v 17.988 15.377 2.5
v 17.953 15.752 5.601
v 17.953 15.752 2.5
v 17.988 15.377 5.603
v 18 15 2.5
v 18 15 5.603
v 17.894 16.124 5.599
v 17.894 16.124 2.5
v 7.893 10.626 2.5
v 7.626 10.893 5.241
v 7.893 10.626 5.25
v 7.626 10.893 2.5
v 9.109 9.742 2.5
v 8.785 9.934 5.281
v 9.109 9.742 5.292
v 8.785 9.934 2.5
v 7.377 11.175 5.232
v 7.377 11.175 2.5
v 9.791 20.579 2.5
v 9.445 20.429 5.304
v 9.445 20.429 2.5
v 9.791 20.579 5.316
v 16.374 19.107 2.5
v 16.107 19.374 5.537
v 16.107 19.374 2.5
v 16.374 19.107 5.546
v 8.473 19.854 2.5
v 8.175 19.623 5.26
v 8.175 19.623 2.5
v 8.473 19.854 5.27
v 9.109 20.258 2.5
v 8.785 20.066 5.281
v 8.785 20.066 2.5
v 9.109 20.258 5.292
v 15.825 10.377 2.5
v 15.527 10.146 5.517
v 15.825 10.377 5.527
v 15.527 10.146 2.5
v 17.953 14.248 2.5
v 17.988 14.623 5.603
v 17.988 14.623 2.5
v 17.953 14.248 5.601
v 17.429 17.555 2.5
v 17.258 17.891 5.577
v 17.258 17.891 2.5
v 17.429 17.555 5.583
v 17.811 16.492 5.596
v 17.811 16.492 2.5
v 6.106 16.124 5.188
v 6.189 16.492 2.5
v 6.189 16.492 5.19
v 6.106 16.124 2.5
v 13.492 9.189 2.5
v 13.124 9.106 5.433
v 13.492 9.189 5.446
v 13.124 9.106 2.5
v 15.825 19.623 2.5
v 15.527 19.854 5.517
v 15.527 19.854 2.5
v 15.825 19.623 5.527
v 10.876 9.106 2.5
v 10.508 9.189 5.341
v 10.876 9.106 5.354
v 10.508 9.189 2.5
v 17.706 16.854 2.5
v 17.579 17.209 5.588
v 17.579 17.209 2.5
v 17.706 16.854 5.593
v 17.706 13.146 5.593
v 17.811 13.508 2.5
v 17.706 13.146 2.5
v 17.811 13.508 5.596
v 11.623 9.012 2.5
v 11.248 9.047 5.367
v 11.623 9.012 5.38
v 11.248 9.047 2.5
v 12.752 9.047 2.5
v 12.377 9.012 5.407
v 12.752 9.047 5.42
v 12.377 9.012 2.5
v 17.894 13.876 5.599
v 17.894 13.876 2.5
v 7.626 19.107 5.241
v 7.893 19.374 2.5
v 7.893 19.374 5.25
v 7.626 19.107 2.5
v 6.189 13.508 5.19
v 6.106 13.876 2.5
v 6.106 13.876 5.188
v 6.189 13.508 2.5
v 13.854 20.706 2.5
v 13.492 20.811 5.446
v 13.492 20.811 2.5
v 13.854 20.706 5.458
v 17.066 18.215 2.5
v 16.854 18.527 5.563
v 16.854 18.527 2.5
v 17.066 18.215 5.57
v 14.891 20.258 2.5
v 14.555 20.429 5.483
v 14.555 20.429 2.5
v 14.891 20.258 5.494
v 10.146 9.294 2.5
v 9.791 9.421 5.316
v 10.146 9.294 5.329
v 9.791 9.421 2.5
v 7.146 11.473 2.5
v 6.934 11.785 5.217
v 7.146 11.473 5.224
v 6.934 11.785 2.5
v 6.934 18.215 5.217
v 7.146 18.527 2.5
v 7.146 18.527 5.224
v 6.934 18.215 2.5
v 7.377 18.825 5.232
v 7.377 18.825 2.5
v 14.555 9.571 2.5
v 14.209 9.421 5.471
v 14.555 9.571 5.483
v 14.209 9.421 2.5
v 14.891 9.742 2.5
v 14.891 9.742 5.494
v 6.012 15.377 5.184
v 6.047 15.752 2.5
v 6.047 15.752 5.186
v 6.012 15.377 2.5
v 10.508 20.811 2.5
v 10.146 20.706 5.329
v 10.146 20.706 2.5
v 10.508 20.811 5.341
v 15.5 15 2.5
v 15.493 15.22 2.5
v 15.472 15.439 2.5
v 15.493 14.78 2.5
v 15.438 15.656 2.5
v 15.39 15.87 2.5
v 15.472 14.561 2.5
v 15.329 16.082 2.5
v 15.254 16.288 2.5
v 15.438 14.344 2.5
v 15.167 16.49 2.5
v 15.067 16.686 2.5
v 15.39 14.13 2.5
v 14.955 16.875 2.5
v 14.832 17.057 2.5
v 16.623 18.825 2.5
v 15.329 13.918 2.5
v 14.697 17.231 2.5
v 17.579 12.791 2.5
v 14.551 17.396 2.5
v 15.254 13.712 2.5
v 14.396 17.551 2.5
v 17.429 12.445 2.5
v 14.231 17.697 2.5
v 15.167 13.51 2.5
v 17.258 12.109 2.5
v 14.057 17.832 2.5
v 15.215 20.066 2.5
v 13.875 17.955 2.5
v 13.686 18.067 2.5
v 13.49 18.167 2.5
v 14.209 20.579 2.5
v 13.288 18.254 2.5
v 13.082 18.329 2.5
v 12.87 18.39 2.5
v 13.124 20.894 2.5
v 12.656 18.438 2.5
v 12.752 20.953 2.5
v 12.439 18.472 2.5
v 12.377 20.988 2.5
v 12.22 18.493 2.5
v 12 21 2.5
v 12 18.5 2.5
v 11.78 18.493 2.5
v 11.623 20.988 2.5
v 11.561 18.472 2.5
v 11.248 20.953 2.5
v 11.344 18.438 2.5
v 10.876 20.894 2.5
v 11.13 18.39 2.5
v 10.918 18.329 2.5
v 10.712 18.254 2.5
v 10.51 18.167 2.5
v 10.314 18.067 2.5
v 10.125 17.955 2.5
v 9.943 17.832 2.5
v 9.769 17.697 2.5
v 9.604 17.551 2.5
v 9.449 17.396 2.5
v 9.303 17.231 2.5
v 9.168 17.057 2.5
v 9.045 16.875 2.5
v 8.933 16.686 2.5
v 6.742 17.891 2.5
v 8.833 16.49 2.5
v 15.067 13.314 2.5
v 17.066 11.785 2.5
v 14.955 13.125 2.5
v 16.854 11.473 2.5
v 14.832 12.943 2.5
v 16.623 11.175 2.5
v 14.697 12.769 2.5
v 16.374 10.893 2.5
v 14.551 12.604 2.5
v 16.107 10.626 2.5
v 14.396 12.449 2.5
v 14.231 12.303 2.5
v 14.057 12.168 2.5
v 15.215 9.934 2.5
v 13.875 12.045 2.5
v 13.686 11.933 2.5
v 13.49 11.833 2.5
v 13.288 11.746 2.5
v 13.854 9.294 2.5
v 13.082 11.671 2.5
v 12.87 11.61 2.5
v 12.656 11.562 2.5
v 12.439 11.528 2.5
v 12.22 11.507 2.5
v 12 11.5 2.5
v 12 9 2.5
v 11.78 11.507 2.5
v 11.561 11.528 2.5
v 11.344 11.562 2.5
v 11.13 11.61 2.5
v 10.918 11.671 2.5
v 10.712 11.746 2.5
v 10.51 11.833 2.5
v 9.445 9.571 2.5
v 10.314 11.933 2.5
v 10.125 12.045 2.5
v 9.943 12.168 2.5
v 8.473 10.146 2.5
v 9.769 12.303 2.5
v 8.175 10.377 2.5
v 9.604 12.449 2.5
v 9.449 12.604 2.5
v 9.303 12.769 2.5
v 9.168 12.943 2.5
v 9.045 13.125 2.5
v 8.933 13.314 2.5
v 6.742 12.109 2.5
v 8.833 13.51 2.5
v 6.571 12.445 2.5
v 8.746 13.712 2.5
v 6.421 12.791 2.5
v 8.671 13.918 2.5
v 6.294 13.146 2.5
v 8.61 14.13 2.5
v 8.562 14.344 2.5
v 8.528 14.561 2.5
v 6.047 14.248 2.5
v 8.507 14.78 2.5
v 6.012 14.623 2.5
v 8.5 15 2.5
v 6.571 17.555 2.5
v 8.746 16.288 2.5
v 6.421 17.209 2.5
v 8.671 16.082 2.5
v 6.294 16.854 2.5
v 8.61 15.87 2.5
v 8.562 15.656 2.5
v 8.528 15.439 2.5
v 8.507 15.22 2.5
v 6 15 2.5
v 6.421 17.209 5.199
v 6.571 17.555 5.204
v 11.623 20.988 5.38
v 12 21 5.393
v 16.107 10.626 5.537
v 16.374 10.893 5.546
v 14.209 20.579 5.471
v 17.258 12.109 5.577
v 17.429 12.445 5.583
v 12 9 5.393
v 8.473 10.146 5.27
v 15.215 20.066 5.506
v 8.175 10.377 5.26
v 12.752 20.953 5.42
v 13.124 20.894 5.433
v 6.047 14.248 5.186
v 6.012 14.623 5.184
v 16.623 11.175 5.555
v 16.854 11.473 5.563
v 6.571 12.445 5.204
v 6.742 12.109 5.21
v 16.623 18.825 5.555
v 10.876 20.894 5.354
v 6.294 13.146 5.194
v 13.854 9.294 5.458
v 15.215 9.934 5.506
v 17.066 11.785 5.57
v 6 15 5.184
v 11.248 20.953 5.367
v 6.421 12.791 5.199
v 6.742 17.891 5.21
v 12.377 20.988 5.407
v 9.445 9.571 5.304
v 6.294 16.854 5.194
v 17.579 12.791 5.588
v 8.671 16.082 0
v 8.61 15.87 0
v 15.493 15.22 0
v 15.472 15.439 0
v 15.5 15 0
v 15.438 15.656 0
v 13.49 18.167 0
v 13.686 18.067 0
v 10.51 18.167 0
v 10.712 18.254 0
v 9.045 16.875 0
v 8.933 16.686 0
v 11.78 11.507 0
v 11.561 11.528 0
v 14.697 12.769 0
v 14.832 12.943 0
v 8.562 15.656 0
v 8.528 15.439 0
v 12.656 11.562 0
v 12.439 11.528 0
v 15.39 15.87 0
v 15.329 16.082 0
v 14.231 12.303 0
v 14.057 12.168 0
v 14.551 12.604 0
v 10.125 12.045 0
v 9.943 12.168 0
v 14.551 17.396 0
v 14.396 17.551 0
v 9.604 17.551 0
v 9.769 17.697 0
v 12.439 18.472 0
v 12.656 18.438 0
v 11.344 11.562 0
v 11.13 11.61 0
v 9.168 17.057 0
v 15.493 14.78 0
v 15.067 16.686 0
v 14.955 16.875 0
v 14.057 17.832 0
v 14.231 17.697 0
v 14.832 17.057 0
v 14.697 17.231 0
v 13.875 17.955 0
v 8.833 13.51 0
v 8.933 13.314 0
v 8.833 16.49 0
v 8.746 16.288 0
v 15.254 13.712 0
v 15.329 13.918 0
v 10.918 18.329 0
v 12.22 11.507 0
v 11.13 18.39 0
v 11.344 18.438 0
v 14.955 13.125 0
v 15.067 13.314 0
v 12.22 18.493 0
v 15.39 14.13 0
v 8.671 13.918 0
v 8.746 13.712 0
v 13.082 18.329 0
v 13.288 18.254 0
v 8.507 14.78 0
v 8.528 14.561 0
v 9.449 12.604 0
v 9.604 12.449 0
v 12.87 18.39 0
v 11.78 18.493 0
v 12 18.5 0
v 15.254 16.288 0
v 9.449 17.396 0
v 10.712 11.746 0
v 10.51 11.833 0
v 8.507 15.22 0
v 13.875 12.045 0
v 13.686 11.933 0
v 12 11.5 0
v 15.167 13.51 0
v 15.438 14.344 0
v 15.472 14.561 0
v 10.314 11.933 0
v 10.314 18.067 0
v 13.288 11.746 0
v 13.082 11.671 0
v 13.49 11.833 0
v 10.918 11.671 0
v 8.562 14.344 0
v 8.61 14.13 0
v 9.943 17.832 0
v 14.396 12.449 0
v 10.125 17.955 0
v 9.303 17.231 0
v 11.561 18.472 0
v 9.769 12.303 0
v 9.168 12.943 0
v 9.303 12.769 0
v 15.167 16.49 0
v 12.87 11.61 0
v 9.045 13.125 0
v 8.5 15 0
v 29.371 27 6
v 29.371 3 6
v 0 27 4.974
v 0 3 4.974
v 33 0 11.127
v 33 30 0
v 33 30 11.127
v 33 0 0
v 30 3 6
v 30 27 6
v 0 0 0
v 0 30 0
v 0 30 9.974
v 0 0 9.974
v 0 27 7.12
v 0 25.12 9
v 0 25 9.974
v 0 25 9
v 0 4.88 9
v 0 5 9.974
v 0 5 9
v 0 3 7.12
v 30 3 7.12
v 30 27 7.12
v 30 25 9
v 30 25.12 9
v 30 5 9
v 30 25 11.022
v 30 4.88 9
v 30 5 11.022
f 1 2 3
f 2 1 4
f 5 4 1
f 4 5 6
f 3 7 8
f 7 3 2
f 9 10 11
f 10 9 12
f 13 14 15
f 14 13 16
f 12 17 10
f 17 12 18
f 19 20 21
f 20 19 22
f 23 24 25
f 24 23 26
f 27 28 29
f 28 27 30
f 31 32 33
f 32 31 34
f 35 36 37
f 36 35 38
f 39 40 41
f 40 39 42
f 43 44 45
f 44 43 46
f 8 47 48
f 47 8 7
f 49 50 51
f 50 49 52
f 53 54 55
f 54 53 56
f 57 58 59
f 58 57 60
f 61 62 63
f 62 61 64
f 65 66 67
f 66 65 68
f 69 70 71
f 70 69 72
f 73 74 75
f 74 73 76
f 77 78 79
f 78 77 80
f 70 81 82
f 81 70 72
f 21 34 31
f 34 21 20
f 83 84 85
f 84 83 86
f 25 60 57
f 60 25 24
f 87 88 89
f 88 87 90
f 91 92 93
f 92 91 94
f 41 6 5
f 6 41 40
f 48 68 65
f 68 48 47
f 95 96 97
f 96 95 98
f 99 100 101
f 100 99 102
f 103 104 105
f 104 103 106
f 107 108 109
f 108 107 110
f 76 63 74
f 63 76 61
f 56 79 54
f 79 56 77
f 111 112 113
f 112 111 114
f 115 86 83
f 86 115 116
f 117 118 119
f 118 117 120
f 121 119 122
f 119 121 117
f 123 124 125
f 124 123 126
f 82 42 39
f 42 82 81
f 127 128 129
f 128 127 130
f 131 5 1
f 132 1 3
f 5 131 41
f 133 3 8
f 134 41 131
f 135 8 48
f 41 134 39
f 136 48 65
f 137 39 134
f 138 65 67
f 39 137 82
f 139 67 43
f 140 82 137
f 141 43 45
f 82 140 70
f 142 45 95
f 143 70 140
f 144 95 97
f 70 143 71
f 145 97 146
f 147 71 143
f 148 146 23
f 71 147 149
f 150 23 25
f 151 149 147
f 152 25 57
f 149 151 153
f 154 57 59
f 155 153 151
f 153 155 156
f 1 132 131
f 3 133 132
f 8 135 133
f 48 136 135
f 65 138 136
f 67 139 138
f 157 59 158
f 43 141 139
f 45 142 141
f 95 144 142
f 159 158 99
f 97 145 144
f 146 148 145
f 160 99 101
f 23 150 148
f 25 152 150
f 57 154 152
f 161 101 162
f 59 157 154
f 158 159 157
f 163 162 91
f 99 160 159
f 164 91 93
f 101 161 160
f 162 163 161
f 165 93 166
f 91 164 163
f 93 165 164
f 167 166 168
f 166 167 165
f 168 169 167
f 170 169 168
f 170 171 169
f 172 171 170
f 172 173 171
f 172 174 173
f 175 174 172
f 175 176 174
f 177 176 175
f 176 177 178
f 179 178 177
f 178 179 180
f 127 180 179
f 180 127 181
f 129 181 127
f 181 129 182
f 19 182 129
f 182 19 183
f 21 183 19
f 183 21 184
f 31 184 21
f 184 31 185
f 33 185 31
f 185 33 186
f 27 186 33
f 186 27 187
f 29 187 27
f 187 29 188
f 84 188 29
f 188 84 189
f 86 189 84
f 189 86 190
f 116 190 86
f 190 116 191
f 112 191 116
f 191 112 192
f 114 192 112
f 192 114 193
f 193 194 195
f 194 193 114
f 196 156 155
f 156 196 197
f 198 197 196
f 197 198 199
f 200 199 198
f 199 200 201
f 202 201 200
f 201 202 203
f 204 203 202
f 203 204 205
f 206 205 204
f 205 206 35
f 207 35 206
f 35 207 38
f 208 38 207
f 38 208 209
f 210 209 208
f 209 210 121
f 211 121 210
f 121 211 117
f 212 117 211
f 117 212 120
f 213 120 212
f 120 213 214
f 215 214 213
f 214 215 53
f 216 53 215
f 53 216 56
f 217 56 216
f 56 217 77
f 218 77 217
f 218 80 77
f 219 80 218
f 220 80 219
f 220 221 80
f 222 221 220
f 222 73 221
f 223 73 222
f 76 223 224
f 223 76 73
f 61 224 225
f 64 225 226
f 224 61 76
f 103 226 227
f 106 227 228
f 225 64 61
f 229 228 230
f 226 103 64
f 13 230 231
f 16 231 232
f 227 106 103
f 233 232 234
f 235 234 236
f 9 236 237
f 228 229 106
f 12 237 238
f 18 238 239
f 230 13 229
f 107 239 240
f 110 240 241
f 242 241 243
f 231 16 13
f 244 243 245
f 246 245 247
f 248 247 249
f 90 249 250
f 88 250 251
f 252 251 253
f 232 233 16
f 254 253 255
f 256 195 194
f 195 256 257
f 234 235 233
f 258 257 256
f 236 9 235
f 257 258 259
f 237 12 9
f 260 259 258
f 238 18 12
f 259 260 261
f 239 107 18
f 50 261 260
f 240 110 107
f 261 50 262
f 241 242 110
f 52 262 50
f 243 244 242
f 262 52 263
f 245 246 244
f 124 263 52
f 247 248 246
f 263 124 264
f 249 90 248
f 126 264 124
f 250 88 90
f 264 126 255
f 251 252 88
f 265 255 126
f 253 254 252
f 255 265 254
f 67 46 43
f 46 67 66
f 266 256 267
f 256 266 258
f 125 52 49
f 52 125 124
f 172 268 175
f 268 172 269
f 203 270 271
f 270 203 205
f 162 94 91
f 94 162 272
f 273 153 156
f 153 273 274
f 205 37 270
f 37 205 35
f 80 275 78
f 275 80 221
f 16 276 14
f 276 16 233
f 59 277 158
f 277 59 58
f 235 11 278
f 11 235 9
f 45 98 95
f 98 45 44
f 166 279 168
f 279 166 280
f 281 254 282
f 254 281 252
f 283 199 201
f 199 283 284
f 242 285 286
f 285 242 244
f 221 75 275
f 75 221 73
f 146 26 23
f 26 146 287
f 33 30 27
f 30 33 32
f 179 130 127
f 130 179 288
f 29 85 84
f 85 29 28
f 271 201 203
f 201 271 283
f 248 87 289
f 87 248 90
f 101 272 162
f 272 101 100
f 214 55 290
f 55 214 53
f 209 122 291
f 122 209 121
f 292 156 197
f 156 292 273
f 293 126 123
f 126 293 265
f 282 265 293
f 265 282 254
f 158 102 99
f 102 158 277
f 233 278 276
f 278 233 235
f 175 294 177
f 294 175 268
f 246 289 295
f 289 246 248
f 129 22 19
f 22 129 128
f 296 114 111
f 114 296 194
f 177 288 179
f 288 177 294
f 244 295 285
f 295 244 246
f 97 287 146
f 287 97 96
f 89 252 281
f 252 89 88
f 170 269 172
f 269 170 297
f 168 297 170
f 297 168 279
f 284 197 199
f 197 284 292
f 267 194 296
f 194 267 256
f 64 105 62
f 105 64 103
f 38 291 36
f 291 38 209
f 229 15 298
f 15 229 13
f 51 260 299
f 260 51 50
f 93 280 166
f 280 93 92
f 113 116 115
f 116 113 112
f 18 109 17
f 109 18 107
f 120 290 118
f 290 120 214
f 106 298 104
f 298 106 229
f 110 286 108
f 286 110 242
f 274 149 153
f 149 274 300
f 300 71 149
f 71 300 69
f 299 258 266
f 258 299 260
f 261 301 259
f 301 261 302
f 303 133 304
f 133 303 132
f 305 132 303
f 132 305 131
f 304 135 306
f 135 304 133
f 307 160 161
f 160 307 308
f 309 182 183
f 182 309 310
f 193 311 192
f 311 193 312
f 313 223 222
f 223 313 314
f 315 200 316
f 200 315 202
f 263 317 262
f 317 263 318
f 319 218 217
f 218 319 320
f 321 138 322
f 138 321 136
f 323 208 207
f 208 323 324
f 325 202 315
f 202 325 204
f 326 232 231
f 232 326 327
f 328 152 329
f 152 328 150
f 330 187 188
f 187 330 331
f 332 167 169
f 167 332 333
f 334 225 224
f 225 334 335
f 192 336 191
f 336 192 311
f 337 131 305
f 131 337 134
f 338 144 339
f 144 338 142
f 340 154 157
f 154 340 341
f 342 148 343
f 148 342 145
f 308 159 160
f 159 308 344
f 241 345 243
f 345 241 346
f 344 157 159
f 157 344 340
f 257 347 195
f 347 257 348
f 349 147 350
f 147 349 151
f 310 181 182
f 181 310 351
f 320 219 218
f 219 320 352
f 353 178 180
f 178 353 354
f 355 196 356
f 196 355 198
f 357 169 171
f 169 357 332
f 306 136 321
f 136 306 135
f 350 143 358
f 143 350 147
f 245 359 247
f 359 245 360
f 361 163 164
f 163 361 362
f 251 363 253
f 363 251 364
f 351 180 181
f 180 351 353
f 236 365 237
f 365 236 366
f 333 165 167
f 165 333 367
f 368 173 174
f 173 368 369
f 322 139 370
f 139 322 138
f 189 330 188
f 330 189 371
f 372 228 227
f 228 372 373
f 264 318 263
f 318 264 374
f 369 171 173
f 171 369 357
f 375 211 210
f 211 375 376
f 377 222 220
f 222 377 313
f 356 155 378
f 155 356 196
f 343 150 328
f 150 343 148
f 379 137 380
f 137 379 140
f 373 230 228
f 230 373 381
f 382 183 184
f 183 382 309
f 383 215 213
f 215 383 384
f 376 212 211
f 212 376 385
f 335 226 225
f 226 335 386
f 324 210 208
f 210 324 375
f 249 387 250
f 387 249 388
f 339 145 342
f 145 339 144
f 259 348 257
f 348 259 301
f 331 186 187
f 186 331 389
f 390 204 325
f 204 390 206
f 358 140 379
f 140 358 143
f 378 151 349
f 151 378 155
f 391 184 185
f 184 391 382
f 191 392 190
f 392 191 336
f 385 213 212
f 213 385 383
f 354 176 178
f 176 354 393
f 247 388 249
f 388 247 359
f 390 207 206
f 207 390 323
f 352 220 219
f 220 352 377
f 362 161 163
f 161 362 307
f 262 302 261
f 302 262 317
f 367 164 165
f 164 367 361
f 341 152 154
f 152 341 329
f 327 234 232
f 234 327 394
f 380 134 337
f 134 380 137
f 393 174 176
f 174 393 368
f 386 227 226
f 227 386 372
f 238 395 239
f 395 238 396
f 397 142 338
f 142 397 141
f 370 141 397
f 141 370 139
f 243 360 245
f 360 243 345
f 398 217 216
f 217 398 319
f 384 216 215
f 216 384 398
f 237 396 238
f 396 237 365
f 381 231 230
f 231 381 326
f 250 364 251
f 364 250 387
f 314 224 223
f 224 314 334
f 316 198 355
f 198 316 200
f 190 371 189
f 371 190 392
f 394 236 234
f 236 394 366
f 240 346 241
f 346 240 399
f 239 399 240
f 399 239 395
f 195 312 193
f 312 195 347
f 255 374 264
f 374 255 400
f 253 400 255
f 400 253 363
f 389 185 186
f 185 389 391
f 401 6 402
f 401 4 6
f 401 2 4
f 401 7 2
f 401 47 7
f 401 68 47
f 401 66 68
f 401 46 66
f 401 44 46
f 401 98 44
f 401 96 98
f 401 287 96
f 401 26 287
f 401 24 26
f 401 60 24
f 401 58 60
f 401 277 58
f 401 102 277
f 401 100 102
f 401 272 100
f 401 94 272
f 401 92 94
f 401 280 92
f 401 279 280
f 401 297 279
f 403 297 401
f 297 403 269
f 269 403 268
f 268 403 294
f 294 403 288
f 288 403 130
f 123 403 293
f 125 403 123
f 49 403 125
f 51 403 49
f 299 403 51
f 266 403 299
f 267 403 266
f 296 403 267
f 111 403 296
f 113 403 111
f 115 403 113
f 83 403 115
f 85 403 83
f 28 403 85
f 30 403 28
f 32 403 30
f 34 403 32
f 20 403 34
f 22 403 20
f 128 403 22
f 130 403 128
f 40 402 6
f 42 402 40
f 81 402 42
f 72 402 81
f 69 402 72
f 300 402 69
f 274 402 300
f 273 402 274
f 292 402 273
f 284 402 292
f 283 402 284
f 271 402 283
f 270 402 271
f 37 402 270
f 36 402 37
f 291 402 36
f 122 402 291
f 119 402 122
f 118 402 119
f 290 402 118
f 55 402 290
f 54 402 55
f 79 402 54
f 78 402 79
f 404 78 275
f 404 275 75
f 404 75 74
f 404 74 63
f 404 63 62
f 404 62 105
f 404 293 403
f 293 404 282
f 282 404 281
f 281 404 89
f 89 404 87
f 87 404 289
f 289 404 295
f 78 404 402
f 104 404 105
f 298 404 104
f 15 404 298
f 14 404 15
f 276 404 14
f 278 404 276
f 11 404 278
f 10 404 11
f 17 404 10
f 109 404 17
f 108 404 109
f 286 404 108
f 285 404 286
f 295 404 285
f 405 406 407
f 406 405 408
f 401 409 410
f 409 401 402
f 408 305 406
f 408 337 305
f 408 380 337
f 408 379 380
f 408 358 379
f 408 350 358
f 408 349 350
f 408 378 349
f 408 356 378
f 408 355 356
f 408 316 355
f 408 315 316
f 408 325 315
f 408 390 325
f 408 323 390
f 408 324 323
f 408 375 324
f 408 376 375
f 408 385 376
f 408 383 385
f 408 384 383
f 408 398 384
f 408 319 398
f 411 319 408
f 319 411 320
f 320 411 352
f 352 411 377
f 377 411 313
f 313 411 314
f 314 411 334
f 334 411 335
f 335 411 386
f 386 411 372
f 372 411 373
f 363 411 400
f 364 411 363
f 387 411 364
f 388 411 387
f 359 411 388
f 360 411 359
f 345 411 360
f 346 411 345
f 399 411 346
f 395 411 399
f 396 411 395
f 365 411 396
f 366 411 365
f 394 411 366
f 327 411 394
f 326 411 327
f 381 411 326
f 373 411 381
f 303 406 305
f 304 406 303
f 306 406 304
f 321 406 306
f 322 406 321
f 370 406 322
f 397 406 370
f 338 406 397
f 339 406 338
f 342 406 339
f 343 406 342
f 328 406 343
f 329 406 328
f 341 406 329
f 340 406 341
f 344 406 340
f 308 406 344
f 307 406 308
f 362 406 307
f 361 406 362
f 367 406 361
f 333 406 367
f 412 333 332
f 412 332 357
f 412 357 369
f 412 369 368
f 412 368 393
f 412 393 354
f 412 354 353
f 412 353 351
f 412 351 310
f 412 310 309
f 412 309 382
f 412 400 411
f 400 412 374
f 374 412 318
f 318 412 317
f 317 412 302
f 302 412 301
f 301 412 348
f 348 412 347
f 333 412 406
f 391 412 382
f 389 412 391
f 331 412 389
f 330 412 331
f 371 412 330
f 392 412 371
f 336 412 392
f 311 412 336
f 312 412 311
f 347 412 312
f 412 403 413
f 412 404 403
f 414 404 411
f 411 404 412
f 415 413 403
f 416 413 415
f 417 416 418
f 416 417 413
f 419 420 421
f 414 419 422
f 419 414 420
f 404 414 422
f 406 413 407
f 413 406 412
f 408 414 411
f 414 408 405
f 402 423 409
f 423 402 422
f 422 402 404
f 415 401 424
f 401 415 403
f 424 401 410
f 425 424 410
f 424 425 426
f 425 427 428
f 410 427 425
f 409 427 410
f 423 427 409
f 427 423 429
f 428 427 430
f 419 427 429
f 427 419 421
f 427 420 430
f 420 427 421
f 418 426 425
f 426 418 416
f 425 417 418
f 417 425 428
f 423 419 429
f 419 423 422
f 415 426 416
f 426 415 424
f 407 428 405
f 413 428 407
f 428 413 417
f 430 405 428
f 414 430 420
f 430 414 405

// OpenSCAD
union(){
difference() {
cube([33,30,6], center=false); //Base
union() {
translate ([12,15,2.5])
cylinder (h = 10, r=6, center = false, $fn=100); //big Hole
translate ([12,15,-10])
cylinder (h = 20, r=3.5, center = false, $fn=100); //small Hole
translate ([15,15,8.5])
rotate([0,-2,0])
cube([40,40,6], center=true); //Slope
}
}
difference(){
union(){
//border
cube([33,3,11], center=false); //left
translate ([0,27,0])
cube([33,3,11], center=false); //right
translate ([30,0,0])
cube([3,30,13], center=false);//bottom

//upper Railing
translate ([0,0,9]) 
cube([33,5,4], center=false); //left
translate ([0,25,9])
cube([33,5,4], center=false); //right

translate ([16.5,2.9,9])
rotate([45,0,0])
cube([33,2.8,2.8], center=true); //left

translate ([16.5,30-2.9,9])
rotate([45,0,0])
cube([33,2.8,2.8], center=true); //right
}

translate ([15,15,13.5])
rotate([0,-2,0])
cube([40,40,6], center=true); //Slope
}
}
